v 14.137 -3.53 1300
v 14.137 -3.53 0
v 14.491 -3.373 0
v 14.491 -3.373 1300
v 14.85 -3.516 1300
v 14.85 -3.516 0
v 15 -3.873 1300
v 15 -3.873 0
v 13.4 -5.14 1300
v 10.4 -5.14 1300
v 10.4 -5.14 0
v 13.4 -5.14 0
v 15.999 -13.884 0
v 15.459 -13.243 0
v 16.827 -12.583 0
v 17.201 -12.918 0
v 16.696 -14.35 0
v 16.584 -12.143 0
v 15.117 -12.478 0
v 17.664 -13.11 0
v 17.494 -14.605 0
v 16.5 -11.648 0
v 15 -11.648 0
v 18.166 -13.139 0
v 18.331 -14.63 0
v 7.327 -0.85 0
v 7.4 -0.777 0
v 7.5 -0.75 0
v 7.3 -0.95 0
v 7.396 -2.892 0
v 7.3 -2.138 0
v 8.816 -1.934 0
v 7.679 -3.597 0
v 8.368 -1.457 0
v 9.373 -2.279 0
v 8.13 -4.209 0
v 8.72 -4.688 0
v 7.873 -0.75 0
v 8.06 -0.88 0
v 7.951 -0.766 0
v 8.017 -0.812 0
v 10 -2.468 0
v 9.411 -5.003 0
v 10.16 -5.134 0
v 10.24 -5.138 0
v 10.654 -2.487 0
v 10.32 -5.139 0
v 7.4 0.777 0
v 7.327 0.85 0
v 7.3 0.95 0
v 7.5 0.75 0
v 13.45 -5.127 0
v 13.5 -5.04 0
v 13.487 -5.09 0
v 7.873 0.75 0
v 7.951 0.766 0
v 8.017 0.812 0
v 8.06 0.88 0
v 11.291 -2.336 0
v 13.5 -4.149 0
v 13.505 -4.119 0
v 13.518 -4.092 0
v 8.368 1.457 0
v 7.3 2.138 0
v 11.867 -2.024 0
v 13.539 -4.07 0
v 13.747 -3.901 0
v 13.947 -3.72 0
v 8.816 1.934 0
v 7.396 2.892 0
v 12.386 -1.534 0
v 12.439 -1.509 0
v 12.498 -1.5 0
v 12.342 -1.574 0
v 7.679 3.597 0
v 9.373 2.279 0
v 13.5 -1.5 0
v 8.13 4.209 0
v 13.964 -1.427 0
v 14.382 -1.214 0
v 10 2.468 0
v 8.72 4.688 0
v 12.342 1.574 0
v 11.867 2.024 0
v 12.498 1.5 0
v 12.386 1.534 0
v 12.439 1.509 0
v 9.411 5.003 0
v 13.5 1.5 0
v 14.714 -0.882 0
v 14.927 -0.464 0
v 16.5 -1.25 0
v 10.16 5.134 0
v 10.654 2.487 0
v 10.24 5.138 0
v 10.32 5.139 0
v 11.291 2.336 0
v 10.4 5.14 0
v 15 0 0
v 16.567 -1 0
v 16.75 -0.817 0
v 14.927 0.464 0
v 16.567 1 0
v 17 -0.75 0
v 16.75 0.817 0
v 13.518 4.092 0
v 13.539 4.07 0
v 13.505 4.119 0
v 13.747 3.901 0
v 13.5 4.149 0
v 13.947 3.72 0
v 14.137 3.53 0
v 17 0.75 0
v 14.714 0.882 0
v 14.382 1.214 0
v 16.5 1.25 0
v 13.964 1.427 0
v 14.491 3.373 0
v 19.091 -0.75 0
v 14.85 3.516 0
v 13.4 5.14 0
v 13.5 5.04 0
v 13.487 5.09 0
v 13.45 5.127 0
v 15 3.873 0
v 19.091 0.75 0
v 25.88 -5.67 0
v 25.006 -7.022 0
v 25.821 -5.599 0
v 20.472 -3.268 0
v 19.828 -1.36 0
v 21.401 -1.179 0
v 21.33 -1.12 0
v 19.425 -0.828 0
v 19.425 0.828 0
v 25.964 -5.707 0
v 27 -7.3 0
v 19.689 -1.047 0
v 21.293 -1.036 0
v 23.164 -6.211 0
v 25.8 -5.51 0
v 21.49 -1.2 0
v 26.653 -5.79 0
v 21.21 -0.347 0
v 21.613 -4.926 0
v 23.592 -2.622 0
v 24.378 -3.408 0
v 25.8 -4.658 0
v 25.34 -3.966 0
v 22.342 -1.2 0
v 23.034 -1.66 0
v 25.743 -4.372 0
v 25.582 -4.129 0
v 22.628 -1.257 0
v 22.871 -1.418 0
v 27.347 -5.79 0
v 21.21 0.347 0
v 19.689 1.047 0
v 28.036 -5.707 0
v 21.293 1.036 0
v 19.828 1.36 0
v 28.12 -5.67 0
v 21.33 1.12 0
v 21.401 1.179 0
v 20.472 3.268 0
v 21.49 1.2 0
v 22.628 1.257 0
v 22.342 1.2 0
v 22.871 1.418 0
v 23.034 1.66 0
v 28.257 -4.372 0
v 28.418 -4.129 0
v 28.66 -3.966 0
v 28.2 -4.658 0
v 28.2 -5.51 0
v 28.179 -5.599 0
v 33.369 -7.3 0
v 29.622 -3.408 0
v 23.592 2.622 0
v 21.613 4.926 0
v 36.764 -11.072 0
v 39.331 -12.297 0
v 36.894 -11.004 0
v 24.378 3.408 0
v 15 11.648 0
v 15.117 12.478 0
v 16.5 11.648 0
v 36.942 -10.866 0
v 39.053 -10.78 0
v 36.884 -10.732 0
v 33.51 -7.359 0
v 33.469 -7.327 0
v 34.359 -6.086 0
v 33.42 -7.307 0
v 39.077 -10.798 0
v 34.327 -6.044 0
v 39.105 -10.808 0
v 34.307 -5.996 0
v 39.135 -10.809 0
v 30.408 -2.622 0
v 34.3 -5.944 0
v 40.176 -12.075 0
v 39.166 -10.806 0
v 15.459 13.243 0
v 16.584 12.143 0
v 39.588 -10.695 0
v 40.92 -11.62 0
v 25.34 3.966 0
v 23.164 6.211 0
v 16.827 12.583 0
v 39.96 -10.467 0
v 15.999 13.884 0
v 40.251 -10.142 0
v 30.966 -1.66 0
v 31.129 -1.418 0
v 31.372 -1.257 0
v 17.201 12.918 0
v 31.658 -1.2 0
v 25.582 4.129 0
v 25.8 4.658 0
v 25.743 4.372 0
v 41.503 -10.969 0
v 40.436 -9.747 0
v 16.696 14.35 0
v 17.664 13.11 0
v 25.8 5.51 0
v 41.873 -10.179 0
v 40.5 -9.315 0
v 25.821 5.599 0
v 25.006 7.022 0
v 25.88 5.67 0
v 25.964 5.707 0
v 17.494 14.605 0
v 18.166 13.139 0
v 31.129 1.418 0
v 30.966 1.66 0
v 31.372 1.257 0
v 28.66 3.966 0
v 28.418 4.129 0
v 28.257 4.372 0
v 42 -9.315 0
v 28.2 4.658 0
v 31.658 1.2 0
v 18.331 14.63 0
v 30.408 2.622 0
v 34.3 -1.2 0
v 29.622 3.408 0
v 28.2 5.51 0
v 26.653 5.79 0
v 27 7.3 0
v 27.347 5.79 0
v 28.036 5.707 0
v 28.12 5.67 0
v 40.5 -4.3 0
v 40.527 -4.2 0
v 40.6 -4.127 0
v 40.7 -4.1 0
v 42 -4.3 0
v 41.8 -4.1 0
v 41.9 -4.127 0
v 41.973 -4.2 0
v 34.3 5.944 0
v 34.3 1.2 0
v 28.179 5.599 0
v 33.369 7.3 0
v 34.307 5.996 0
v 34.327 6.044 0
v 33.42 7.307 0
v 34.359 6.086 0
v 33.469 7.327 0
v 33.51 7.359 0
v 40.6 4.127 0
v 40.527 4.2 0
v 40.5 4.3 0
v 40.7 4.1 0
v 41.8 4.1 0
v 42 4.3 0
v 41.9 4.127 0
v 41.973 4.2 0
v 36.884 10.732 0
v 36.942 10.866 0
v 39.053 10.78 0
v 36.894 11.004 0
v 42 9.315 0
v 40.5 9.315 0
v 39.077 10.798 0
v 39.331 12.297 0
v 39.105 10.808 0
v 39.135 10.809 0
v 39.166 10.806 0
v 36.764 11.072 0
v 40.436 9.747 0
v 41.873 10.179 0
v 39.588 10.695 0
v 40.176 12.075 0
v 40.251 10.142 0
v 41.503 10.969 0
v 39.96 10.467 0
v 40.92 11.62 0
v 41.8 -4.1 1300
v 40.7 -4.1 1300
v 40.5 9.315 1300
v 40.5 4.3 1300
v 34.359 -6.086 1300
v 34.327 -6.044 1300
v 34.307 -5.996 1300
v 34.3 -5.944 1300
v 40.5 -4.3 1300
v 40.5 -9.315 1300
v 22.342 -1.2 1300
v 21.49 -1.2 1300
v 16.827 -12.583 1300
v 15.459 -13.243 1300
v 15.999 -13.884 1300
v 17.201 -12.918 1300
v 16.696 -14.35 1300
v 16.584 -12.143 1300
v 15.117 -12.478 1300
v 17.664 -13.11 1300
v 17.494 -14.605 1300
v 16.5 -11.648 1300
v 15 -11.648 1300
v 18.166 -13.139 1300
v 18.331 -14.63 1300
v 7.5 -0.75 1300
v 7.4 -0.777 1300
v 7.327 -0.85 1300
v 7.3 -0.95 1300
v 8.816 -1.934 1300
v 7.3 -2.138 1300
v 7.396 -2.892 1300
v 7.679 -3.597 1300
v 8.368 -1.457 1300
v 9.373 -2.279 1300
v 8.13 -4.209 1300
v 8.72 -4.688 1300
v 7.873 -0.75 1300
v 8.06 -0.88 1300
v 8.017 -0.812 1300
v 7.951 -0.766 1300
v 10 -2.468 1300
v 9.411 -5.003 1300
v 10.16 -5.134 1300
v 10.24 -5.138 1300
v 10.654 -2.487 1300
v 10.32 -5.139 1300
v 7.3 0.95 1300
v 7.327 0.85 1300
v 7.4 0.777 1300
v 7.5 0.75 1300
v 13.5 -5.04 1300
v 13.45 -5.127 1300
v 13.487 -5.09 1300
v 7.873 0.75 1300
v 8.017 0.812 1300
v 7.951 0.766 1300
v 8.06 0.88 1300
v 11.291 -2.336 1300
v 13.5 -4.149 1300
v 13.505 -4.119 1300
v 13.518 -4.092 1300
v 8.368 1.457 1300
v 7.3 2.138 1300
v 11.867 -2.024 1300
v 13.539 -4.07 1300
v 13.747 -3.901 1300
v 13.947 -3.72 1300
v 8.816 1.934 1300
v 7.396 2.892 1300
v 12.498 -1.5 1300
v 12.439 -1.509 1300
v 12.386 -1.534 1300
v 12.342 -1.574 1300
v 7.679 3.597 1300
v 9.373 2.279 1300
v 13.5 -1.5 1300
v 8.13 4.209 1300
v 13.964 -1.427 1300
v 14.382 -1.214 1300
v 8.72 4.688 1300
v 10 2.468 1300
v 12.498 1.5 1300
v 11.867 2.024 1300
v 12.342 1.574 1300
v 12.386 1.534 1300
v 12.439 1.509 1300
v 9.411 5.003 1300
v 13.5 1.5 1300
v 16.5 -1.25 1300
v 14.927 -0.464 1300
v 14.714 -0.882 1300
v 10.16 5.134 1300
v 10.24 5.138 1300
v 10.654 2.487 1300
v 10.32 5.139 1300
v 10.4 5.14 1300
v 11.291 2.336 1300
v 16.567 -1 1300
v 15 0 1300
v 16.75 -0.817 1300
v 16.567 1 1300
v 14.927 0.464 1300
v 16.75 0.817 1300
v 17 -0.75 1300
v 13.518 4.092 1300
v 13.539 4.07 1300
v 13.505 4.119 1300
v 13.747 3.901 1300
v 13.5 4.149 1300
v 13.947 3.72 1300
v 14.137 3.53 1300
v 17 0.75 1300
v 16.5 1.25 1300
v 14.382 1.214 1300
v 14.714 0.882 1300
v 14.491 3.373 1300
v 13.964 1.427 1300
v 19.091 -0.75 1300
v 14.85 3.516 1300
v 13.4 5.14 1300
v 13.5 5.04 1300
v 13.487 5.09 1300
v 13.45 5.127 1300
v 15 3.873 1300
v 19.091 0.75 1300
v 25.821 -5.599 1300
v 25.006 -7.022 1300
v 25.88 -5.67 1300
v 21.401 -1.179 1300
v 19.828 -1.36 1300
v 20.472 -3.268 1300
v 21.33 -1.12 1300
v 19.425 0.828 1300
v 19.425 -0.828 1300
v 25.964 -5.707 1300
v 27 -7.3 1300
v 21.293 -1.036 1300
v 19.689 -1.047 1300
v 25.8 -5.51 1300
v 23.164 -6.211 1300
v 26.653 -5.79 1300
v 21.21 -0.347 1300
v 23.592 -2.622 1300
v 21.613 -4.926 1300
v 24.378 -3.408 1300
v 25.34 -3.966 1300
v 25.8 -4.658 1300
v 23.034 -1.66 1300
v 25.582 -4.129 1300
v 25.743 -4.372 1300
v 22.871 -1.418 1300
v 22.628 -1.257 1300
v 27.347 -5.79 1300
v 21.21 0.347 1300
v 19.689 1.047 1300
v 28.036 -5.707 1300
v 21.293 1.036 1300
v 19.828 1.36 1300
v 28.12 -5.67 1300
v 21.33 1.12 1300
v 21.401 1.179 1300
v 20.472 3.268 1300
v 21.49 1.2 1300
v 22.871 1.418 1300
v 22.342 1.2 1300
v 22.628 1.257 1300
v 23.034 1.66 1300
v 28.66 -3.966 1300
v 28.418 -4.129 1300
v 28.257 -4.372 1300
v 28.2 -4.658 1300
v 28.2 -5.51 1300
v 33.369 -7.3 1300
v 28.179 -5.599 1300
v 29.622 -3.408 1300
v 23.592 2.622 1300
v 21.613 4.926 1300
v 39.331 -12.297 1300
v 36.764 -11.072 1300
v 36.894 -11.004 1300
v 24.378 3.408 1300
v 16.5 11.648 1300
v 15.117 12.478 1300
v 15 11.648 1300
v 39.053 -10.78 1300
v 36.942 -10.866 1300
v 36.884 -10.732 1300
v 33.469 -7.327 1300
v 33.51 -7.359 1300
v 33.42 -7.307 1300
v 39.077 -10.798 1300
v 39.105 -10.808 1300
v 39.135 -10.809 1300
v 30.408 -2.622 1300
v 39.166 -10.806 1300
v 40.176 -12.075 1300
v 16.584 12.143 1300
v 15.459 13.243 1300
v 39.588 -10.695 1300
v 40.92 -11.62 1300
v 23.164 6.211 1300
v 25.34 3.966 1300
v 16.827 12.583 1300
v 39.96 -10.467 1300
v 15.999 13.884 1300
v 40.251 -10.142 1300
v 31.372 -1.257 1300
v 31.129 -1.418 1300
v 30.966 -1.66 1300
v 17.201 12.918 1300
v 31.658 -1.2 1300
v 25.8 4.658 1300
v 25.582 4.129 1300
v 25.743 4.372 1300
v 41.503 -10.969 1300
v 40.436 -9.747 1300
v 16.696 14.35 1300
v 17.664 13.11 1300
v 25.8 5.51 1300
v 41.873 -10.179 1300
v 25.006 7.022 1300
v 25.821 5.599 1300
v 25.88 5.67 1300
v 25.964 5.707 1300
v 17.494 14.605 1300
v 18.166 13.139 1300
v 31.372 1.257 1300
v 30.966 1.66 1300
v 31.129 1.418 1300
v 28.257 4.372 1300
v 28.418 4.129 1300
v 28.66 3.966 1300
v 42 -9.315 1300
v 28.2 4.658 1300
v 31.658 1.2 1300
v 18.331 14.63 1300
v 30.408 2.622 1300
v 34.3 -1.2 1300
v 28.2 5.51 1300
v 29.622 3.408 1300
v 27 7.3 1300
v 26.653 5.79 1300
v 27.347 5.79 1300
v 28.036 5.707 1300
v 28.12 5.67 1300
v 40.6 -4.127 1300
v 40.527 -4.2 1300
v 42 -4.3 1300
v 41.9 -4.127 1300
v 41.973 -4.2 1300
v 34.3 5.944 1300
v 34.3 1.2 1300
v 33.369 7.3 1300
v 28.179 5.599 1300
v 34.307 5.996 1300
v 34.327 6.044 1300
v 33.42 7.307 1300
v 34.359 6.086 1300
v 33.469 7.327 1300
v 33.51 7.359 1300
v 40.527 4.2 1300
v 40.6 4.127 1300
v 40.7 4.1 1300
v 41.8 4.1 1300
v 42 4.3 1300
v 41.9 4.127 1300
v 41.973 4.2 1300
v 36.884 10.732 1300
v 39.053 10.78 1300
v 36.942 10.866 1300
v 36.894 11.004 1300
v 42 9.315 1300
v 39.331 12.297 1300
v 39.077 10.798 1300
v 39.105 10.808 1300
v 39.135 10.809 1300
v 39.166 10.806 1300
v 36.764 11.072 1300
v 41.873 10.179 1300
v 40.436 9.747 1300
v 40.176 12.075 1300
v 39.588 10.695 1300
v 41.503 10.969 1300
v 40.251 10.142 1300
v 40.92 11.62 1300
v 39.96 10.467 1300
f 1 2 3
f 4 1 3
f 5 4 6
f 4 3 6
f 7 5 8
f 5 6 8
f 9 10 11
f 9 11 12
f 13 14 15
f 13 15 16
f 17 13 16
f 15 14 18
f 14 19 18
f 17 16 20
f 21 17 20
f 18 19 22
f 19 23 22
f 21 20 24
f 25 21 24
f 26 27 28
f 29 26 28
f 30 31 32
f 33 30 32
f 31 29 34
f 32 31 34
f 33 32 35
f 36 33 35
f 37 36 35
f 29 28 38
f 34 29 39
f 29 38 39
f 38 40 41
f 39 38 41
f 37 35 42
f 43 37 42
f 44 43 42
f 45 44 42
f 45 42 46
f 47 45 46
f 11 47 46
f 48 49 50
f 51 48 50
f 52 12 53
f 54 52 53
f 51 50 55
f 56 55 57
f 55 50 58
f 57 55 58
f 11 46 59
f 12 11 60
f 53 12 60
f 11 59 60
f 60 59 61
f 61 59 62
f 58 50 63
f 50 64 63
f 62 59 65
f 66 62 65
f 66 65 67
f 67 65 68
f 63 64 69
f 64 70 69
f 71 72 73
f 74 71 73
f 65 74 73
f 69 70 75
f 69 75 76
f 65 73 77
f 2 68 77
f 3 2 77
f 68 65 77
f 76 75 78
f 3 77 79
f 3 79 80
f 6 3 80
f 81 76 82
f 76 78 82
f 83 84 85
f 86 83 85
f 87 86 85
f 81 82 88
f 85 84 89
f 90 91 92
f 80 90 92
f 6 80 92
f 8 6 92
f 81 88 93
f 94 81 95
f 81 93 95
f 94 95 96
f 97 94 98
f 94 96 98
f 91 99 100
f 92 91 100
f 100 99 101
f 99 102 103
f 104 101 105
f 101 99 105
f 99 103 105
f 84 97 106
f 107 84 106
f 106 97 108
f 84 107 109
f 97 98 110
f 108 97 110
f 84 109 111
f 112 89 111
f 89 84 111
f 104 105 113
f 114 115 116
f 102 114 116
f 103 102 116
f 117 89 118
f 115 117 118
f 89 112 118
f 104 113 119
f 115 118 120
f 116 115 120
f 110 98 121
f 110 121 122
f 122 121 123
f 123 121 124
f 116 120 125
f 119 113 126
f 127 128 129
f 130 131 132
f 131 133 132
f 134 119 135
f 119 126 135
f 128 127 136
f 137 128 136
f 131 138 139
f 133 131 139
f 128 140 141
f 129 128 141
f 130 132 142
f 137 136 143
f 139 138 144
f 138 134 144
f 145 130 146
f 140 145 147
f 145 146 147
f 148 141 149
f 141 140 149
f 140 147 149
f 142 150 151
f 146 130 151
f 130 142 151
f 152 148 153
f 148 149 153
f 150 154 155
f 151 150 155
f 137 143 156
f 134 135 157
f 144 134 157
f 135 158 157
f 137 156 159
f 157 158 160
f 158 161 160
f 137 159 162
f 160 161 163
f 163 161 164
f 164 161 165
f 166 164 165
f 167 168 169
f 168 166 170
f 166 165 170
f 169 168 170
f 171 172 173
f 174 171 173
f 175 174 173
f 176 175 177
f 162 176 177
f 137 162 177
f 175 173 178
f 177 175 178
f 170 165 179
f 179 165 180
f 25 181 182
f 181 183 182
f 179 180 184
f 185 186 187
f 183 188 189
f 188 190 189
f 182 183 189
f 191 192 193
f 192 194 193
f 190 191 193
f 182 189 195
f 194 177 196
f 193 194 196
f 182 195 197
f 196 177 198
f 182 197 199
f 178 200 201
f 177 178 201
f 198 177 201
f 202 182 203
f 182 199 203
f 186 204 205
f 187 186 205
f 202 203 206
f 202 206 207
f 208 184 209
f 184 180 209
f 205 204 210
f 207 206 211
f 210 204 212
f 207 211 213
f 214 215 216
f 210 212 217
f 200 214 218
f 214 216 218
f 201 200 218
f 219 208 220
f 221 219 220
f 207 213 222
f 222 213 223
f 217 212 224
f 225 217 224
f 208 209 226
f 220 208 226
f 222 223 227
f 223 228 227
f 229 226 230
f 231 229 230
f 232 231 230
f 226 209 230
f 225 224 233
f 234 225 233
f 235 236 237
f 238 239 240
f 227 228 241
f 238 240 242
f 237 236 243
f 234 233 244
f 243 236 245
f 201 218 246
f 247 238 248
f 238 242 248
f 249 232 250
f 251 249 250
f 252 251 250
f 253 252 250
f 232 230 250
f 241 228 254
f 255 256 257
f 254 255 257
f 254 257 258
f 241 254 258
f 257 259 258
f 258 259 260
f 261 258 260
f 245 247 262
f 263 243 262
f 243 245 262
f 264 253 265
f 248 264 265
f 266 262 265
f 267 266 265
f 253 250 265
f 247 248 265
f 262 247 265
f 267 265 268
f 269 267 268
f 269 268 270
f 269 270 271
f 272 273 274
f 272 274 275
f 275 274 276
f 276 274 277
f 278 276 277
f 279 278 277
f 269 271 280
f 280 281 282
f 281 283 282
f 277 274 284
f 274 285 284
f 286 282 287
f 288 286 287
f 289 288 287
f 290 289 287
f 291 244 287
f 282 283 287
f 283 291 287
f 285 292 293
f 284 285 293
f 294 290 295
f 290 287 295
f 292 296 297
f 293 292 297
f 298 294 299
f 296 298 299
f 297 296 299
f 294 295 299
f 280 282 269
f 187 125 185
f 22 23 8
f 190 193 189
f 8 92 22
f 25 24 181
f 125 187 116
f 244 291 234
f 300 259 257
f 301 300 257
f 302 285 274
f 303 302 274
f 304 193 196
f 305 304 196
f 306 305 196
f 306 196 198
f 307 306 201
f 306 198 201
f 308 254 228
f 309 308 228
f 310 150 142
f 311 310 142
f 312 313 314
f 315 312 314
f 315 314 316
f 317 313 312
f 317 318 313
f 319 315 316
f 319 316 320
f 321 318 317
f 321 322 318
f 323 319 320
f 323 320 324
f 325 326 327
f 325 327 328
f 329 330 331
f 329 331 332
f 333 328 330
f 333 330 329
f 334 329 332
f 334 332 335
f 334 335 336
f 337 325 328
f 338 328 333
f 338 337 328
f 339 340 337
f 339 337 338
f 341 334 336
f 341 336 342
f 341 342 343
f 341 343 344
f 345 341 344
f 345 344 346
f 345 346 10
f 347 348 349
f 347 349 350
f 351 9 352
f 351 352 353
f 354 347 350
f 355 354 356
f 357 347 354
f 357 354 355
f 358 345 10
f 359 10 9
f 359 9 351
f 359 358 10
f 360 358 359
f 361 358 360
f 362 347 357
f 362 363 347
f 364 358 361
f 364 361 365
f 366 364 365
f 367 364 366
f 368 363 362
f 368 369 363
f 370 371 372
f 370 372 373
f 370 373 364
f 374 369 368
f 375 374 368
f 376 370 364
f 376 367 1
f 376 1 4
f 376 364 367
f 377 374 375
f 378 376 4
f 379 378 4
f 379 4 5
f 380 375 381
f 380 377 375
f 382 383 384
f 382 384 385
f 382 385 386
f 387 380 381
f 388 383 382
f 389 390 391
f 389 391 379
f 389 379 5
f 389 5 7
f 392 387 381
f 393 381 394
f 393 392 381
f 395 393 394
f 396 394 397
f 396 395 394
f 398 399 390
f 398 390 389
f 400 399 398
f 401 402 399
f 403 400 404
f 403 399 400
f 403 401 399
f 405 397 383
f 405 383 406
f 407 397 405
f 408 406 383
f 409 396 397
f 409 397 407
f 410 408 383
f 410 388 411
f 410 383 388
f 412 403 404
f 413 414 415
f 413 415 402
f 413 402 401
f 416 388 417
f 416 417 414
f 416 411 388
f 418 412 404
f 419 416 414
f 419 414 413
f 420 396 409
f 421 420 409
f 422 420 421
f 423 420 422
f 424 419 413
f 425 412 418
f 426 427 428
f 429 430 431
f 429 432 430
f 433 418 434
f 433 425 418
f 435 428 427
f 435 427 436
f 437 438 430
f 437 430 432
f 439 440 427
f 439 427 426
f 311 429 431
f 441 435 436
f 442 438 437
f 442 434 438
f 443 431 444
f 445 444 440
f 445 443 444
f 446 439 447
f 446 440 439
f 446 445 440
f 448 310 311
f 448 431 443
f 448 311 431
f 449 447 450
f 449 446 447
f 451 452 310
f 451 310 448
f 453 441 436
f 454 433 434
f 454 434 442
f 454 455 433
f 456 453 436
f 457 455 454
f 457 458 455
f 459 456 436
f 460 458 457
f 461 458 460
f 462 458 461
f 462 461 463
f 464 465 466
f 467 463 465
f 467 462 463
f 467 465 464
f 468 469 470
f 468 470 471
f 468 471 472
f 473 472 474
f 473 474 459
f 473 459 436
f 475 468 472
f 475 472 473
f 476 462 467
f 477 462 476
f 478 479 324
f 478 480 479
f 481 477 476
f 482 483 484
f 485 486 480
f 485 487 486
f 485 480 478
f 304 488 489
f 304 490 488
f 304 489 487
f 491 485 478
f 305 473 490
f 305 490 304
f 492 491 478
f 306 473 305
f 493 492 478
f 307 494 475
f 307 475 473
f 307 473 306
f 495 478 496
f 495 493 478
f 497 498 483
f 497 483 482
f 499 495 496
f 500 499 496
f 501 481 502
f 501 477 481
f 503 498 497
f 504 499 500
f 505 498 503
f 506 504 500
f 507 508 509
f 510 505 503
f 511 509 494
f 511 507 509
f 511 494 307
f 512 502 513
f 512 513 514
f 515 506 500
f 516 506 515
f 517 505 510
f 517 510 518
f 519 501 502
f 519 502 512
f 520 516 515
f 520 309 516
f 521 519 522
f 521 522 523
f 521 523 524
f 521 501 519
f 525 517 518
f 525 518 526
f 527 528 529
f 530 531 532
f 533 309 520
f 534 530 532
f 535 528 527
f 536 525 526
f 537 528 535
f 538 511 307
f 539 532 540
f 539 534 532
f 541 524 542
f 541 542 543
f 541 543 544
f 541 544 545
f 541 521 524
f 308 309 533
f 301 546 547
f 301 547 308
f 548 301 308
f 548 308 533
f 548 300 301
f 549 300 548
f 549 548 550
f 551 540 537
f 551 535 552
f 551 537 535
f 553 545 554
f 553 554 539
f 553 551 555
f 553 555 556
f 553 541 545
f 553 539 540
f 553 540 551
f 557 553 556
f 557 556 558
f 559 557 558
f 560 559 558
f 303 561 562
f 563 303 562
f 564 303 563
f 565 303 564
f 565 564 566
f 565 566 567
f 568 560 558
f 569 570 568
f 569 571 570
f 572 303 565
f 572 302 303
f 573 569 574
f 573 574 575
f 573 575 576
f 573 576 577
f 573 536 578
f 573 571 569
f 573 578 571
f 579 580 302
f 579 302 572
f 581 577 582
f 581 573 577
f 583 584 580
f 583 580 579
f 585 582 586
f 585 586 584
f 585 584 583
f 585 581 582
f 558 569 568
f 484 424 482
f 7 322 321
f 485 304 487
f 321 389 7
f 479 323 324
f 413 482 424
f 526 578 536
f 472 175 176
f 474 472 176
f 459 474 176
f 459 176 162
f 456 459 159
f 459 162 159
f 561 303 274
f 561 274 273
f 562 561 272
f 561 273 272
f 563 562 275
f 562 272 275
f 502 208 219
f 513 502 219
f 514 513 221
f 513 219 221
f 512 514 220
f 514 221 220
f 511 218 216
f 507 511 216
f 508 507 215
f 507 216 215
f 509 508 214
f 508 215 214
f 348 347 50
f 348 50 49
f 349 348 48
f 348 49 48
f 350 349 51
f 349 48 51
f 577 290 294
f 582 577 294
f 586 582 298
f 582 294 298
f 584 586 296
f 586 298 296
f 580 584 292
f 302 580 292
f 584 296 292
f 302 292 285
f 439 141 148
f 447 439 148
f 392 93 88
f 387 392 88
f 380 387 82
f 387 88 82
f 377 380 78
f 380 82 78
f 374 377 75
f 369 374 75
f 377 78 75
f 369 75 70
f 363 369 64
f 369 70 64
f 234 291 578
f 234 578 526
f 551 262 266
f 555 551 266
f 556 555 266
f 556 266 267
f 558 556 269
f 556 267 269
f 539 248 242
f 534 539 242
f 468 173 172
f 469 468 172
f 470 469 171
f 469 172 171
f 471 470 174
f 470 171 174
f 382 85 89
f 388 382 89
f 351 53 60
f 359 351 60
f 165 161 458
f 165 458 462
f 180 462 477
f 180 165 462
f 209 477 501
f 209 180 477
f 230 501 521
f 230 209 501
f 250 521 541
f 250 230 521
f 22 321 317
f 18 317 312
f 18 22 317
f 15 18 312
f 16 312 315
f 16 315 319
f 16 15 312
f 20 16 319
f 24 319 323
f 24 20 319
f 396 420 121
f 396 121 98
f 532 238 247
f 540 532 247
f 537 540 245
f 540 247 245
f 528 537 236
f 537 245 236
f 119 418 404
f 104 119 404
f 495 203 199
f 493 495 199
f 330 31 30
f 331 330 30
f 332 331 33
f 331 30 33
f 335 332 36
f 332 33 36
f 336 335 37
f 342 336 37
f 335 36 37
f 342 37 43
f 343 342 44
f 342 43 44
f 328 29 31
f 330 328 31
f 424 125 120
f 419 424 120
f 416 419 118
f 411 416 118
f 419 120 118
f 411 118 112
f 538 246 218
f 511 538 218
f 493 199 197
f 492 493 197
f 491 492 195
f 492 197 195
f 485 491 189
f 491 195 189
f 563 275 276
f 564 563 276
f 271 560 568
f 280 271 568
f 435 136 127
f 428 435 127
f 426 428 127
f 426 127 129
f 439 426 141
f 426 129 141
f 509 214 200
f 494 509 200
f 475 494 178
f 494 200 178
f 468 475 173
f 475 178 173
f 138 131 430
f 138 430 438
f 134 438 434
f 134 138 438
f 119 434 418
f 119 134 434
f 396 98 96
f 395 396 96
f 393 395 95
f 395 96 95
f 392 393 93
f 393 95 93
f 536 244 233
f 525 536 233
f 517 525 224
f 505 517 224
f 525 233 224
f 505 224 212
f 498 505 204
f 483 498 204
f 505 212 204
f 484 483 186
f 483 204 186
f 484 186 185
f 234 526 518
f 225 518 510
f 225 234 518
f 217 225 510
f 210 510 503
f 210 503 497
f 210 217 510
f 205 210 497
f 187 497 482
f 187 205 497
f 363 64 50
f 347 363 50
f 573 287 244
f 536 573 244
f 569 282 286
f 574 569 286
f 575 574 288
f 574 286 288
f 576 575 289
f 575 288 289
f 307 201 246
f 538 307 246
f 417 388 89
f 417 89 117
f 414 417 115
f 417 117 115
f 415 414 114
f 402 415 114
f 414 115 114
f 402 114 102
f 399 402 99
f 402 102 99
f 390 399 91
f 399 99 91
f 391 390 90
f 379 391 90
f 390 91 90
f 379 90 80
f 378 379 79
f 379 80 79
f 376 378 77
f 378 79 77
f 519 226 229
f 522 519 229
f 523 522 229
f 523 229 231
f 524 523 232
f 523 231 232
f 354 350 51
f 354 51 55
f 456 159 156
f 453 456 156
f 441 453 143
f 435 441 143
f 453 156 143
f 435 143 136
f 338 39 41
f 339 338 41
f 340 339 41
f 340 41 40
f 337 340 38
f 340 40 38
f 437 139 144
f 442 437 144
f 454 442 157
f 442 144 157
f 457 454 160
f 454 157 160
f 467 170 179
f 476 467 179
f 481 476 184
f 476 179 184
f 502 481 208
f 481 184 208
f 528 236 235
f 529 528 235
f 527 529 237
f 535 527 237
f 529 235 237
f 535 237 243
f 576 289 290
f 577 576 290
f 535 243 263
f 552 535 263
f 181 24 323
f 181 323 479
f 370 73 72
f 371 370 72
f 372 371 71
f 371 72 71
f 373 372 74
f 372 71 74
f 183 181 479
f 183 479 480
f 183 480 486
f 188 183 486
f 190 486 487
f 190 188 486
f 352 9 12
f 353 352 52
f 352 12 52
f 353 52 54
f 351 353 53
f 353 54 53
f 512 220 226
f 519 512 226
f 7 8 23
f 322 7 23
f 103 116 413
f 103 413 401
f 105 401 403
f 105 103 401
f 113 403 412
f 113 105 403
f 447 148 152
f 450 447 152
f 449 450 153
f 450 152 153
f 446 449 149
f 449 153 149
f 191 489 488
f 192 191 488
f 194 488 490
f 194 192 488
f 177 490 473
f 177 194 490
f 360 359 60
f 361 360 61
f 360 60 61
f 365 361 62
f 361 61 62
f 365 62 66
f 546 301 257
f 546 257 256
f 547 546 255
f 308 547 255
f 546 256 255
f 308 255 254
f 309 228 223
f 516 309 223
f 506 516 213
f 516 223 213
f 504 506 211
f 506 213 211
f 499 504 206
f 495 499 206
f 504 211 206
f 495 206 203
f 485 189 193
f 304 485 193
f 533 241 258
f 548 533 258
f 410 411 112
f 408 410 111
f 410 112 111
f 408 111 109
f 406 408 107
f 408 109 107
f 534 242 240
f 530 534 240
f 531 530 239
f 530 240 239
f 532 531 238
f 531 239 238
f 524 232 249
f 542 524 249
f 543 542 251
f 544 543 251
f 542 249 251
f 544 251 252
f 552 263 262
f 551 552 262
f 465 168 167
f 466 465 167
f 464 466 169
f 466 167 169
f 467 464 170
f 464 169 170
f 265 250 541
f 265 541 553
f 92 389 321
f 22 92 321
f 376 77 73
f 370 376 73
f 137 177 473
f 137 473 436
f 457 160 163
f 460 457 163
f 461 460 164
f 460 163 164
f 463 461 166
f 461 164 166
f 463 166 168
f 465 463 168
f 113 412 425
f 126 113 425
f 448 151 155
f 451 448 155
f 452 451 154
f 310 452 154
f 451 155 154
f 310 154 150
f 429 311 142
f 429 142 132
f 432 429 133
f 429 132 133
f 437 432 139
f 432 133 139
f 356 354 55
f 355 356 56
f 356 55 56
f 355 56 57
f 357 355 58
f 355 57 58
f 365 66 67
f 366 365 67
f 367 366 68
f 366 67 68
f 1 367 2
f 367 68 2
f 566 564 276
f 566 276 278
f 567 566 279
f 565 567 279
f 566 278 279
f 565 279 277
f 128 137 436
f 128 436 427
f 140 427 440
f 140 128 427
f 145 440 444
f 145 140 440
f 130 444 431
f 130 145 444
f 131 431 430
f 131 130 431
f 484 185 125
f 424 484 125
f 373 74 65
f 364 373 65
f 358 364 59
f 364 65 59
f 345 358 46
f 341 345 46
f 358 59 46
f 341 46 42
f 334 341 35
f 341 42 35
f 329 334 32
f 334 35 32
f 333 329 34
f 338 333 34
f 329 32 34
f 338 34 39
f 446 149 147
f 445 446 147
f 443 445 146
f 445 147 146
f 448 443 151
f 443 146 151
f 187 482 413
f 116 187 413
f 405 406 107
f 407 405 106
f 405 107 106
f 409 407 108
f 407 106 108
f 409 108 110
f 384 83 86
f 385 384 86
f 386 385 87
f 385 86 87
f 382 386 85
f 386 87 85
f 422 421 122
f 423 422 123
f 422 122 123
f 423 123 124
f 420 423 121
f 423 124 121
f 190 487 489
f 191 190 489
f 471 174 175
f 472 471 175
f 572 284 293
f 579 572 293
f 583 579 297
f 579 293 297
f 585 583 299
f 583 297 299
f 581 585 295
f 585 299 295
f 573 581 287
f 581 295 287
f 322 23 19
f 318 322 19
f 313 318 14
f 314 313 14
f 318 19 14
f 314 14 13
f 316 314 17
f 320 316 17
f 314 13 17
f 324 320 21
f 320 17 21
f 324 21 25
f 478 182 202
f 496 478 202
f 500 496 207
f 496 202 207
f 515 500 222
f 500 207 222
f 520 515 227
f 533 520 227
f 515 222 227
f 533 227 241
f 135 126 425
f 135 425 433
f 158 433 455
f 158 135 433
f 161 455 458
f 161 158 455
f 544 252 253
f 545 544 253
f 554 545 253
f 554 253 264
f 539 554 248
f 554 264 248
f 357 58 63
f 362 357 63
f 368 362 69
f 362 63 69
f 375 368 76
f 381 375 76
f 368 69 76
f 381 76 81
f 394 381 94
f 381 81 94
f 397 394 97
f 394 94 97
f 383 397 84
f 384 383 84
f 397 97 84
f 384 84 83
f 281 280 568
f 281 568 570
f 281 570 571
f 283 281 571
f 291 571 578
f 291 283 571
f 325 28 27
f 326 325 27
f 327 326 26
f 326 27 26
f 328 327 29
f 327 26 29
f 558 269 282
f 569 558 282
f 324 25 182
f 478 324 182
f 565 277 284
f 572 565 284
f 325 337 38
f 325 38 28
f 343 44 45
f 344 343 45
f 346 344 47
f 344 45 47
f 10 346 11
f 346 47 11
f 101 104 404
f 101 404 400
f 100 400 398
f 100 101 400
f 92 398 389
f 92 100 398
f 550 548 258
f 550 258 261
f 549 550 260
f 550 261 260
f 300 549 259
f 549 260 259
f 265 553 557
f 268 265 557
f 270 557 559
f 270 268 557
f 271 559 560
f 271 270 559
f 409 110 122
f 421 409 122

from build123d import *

# Parameters (mm, degrees)
EXTRUDE1_DEPTH = 1300


with BuildPart() as part:
    # Sketch1 → Extrude1 (new body)
    with BuildSketch(Plane.XY):
        with BuildLine():
            Line((21.490009074, 1.2), (22.34167412, 1.2))
            ThreePointArc((22.34167412, 1.2), (22.757184066, 1.325619119), (23.033504697, 1.66039604))
            ThreePointArc((23.033504697, 1.66039604), (23.959440841, 3.040559159), (25.33960396, 3.966495303))
            ThreePointArc((25.33960396, 3.966495303), (25.674380881, 4.242815934), (25.8, 4.65832588))
            Line((25.8, 4.65832588), (25.8, 5.509990926))
            ThreePointArc((25.8, 5.509990926), (25.846470105, 5.638164914), (25.964285714, 5.706776316))
            ThreePointArc((25.964285714, 5.706776316), (27, 5.8), (28.035714286, 5.706776316))
            ThreePointArc((28.035714286, 5.706776316), (28.153529895, 5.638164914), (28.2, 5.509990926))
            Line((28.2, 5.509990926), (28.2, 4.65832588))
            ThreePointArc((28.2, 4.65832588), (28.325619119, 4.242815934), (28.66039604, 3.966495303))
            ThreePointArc((28.66039604, 3.966495303), (30.040559159, 3.040559159), (30.966495303, 1.66039604))
            ThreePointArc((30.966495303, 1.66039604), (31.242815934, 1.325619119), (31.65832588, 1.2))
            Line((31.65832588, 1.2), (34.3, 1.2))
            Line((34.3, 1.2), (34.3, 5.944365081))
            ThreePointArc((34.3, 5.944365081), (34.315224093, 6.020901768), (34.358578644, 6.085786438))
            Line((34.358578644, 6.085786438), (39.053219906, 10.7804277))
            ThreePointArc((39.053219906, 10.7804277), (39.09082989, 10.804079854), (39.134973737, 10.809105395))
            Line((39.134973737, 10.809105395), (39.165647289, 10.805697223))
            ThreePointArc((39.165647289, 10.805697223), (40.117692027, 10.315253814), (40.5, 9.314871621))
            Line((40.5, 9.314871621), (40.5, 4.3))
            ThreePointArc((40.5, 4.3), (40.558578644, 4.158578644), (40.7, 4.1))
            Line((40.7, 4.1), (41.8, 4.1))
            ThreePointArc((41.8, 4.1), (41.941421356, 4.158578644), (42, 4.3))
            Line((42, 4.3), (42, 9.314871621))
            ThreePointArc((42, 9.314871621), (41.235384054, 11.315636008), (39.331294578, 12.296522825))
            Line((39.331294578, 12.296522825), (18.331294578, 14.629856158))
            ThreePointArc((18.331294578, 14.629856158), (15.999235613, 13.883589008), (15, 11.648204954))
            Line((15, 11.648204954), (15, 3.87298837))
            ThreePointArc((15, 3.87298837), (14.684748025, 3.408372219), (14.13652733, 3.529640706))
            ThreePointArc((14.13652733, 3.529640706), (13.848340865, 3.811685359), (13.538931751, 4.070271178))
            ThreePointArc((13.538931751, 4.070271178), (13.510259193, 4.105338584), (13.5, 4.149458734))
            Line((13.5, 4.149458734), (13.5, 5.04003891))
            ThreePointArc((13.5, 5.04003891), (13.470710678, 5.110749588), (13.4, 5.14003891))
            Line((13.4, 5.14003891), (10.4, 5.14003891))
            ThreePointArc((10.4, 5.14003891), (10.279875007, 5.138635031), (10.159815633, 5.134424161))
            ThreePointArc((10.159815633, 5.134424161), (8.129682846, 4.208865984), (7.3, 2.137701227))
            Line((7.3, 2.137701227), (7.3, 0.95))
            ThreePointArc((7.3, 0.95), (7.358578644, 0.808578644), (7.5, 0.75))
            Line((7.5, 0.75), (7.872649609, 0.75))
            ThreePointArc((7.872649609, 0.75), (7.986504617, 0.785570571), (8.059860749, 0.87962963))
            ThreePointArc((8.059860749, 0.87962963), (9.999819413, 2.467763258), (12.342238608, 1.574074074))
            ThreePointArc((12.342238608, 1.574074074), (12.4115514, 1.519465813), (12.497617696, 1.5))
            Line((12.497617696, 1.5), (13.5, 1.5))
            ThreePointArc((13.5, 1.5), (15, 0), (13.5, -1.5))
            Line((13.5, -1.5), (12.497617696, -1.5))
            ThreePointArc((12.497617696, -1.5), (12.4115514, -1.519465813), (12.342238608, -1.574074074))
            ThreePointArc((12.342238608, -1.574074074), (9.999819413, -2.467763258), (8.059860749, -0.87962963))
            ThreePointArc((8.059860749, -0.87962963), (7.986504617, -0.785570571), (7.872649609, -0.75))
            Line((7.872649609, -0.75), (7.5, -0.75))
            ThreePointArc((7.5, -0.75), (7.358578644, -0.808578644), (7.3, -0.95))
            Line((7.3, -0.95), (7.3, -2.137701227))
            ThreePointArc((7.3, -2.137701227), (8.129682846, -4.208865984), (10.159815633, -5.134424161))
            ThreePointArc((10.159815633, -5.134424161), (10.279875007, -5.138635031), (10.4, -5.14003891))
            Line((10.4, -5.14003891), (13.4, -5.14003891))
            ThreePointArc((13.4, -5.14003891), (13.470710678, -5.110749588), (13.5, -5.04003891))
            Line((13.5, -5.04003891), (13.5, -4.149458734))
            ThreePointArc((13.5, -4.149458734), (13.510259193, -4.105338584), (13.538931751, -4.070271178))
            ThreePointArc((13.538931751, -4.070271178), (13.848340865, -3.811685359), (14.13652733, -3.529640706))
            ThreePointArc((14.13652733, -3.529640706), (14.684748025, -3.408372219), (15, -3.87298837))
            Line((15, -3.87298837), (15, -11.648204954))
            ThreePointArc((15, -11.648204954), (15.999235613, -13.883589008), (18.331294578, -14.629856158))
            Line((18.331294578, -14.629856158), (39.331294578, -12.296522825))
            ThreePointArc((39.331294578, -12.296522825), (41.235384054, -11.315636008), (42, -9.314871621))
            Line((42, -9.314871621), (42, -4.3))
            ThreePointArc((42, -4.3), (41.941421356, -4.158578644), (41.8, -4.1))
            Line((41.8, -4.1), (40.7, -4.1))
            ThreePointArc((40.7, -4.1), (40.558578644, -4.158578644), (40.5, -4.3))
            Line((40.5, -4.3), (40.5, -9.314871621))
            ThreePointArc((40.5, -9.314871621), (40.117692027, -10.315253814), (39.165647289, -10.805697223))
            Line((39.165647289, -10.805697223), (39.134973737, -10.809105395))
            ThreePointArc((39.134973737, -10.809105395), (39.09082989, -10.804079854), (39.053219906, -10.7804277))
            Line((39.053219906, -10.7804277), (34.358578644, -6.085786438))
            ThreePointArc((34.358578644, -6.085786438), (34.315224093, -6.020901768), (34.3, -5.944365081))
            Line((34.3, -5.944365081), (34.3, -1.2))
            Line((34.3, -1.2), (31.65832588, -1.2))
            ThreePointArc((31.65832588, -1.2), (31.242815934, -1.325619119), (30.966495303, -1.66039604))
            ThreePointArc((30.966495303, -1.66039604), (30.040559159, -3.040559159), (28.66039604, -3.966495303))
            ThreePointArc((28.66039604, -3.966495303), (28.325619119, -4.242815934), (28.2, -4.65832588))
            Line((28.2, -4.65832588), (28.2, -5.509990926))
            ThreePointArc((28.2, -5.509990926), (28.153529895, -5.638164914), (28.035714286, -5.706776316))
            ThreePointArc((28.035714286, -5.706776316), (27, -5.8), (25.964285714, -5.706776316))
            ThreePointArc((25.964285714, -5.706776316), (25.846470105, -5.638164914), (25.8, -5.509990926))
            Line((25.8, -5.509990926), (25.8, -4.65832588))
            ThreePointArc((25.8, -4.65832588), (25.674380881, -4.242815934), (25.33960396, -3.966495303))
            ThreePointArc((25.33960396, -3.966495303), (23.959440841, -3.040559159), (23.033504697, -1.66039604))
            ThreePointArc((23.033504697, -1.66039604), (22.757184066, -1.325619119), (22.34167412, -1.2))
            Line((22.34167412, -1.2), (21.490009074, -1.2))
            ThreePointArc((21.490009074, -1.2), (21.361835086, -1.153529895), (21.293223684, -1.035714286))
            ThreePointArc((21.293223684, -1.035714286), (21.2, 0), (21.293223684, 1.035714286))
            ThreePointArc((21.293223684, 1.035714286), (21.361835086, 1.153529895), (21.490009074, 1.2))
        make_face()
        with BuildLine():
            Line((16.5, -1.25), (16.5, -11.648204954))
            ThreePointArc((16.5, -11.648204954), (16.999617806, -12.765896981), (18.165647289, -13.139030556))
            Line((18.165647289, -13.139030556), (36.764437067, -11.072498358))
            ThreePointArc((36.764437067, -11.072498358), (36.931076425, -10.939923), (36.883772118, -10.732300255))
            Line((36.883772118, -10.732300255), (33.510050506, -7.358578644))
            ThreePointArc((33.510050506, -7.358578644), (33.445165837, -7.315224093), (33.36862915, -7.3))
            Line((33.36862915, -7.3), (27, -7.3))
            ThreePointArc((27, -7.3), (22.343811305, -5.622268833), (19.827850799, -1.360248447))
            ThreePointArc((19.827850799, -1.360248447), (19.569361706, -0.92236964), (19.090986155, -0.75))
            Line((19.090986155, -0.75), (17, -0.75))
            ThreePointArc((17, -0.75), (16.646446609, -0.896446609), (16.5, -1.25))
        make_face(mode=Mode.SUBTRACT)
        with BuildLine():
            Line((17, 0.75), (19.090986155, 0.75))
            ThreePointArc((19.090986155, 0.75), (19.569361706, 0.92236964), (19.827850799, 1.360248447))
            ThreePointArc((19.827850799, 1.360248447), (22.343811305, 5.622268833), (27, 7.3))
            Line((27, 7.3), (33.36862915, 7.3))
            ThreePointArc((33.36862915, 7.3), (33.445165837, 7.315224093), (33.510050506, 7.358578644))
            Line((33.510050506, 7.358578644), (36.883772118, 10.732300255))
            ThreePointArc((36.883772118, 10.732300255), (36.931076425, 10.939923), (36.764437067, 11.072498358))
            Line((36.764437067, 11.072498358), (18.165647289, 13.139030556))
            ThreePointArc((18.165647289, 13.139030556), (16.999617806, 12.765896981), (16.5, 11.648204954))
            Line((16.5, 11.648204954), (16.5, 1.25))
            ThreePointArc((16.5, 1.25), (16.646446609, 0.896446609), (17, 0.75))
        make_face(mode=Mode.SUBTRACT)
    extrude(amount=EXTRUDE1_DEPTH)


solid = part.part
